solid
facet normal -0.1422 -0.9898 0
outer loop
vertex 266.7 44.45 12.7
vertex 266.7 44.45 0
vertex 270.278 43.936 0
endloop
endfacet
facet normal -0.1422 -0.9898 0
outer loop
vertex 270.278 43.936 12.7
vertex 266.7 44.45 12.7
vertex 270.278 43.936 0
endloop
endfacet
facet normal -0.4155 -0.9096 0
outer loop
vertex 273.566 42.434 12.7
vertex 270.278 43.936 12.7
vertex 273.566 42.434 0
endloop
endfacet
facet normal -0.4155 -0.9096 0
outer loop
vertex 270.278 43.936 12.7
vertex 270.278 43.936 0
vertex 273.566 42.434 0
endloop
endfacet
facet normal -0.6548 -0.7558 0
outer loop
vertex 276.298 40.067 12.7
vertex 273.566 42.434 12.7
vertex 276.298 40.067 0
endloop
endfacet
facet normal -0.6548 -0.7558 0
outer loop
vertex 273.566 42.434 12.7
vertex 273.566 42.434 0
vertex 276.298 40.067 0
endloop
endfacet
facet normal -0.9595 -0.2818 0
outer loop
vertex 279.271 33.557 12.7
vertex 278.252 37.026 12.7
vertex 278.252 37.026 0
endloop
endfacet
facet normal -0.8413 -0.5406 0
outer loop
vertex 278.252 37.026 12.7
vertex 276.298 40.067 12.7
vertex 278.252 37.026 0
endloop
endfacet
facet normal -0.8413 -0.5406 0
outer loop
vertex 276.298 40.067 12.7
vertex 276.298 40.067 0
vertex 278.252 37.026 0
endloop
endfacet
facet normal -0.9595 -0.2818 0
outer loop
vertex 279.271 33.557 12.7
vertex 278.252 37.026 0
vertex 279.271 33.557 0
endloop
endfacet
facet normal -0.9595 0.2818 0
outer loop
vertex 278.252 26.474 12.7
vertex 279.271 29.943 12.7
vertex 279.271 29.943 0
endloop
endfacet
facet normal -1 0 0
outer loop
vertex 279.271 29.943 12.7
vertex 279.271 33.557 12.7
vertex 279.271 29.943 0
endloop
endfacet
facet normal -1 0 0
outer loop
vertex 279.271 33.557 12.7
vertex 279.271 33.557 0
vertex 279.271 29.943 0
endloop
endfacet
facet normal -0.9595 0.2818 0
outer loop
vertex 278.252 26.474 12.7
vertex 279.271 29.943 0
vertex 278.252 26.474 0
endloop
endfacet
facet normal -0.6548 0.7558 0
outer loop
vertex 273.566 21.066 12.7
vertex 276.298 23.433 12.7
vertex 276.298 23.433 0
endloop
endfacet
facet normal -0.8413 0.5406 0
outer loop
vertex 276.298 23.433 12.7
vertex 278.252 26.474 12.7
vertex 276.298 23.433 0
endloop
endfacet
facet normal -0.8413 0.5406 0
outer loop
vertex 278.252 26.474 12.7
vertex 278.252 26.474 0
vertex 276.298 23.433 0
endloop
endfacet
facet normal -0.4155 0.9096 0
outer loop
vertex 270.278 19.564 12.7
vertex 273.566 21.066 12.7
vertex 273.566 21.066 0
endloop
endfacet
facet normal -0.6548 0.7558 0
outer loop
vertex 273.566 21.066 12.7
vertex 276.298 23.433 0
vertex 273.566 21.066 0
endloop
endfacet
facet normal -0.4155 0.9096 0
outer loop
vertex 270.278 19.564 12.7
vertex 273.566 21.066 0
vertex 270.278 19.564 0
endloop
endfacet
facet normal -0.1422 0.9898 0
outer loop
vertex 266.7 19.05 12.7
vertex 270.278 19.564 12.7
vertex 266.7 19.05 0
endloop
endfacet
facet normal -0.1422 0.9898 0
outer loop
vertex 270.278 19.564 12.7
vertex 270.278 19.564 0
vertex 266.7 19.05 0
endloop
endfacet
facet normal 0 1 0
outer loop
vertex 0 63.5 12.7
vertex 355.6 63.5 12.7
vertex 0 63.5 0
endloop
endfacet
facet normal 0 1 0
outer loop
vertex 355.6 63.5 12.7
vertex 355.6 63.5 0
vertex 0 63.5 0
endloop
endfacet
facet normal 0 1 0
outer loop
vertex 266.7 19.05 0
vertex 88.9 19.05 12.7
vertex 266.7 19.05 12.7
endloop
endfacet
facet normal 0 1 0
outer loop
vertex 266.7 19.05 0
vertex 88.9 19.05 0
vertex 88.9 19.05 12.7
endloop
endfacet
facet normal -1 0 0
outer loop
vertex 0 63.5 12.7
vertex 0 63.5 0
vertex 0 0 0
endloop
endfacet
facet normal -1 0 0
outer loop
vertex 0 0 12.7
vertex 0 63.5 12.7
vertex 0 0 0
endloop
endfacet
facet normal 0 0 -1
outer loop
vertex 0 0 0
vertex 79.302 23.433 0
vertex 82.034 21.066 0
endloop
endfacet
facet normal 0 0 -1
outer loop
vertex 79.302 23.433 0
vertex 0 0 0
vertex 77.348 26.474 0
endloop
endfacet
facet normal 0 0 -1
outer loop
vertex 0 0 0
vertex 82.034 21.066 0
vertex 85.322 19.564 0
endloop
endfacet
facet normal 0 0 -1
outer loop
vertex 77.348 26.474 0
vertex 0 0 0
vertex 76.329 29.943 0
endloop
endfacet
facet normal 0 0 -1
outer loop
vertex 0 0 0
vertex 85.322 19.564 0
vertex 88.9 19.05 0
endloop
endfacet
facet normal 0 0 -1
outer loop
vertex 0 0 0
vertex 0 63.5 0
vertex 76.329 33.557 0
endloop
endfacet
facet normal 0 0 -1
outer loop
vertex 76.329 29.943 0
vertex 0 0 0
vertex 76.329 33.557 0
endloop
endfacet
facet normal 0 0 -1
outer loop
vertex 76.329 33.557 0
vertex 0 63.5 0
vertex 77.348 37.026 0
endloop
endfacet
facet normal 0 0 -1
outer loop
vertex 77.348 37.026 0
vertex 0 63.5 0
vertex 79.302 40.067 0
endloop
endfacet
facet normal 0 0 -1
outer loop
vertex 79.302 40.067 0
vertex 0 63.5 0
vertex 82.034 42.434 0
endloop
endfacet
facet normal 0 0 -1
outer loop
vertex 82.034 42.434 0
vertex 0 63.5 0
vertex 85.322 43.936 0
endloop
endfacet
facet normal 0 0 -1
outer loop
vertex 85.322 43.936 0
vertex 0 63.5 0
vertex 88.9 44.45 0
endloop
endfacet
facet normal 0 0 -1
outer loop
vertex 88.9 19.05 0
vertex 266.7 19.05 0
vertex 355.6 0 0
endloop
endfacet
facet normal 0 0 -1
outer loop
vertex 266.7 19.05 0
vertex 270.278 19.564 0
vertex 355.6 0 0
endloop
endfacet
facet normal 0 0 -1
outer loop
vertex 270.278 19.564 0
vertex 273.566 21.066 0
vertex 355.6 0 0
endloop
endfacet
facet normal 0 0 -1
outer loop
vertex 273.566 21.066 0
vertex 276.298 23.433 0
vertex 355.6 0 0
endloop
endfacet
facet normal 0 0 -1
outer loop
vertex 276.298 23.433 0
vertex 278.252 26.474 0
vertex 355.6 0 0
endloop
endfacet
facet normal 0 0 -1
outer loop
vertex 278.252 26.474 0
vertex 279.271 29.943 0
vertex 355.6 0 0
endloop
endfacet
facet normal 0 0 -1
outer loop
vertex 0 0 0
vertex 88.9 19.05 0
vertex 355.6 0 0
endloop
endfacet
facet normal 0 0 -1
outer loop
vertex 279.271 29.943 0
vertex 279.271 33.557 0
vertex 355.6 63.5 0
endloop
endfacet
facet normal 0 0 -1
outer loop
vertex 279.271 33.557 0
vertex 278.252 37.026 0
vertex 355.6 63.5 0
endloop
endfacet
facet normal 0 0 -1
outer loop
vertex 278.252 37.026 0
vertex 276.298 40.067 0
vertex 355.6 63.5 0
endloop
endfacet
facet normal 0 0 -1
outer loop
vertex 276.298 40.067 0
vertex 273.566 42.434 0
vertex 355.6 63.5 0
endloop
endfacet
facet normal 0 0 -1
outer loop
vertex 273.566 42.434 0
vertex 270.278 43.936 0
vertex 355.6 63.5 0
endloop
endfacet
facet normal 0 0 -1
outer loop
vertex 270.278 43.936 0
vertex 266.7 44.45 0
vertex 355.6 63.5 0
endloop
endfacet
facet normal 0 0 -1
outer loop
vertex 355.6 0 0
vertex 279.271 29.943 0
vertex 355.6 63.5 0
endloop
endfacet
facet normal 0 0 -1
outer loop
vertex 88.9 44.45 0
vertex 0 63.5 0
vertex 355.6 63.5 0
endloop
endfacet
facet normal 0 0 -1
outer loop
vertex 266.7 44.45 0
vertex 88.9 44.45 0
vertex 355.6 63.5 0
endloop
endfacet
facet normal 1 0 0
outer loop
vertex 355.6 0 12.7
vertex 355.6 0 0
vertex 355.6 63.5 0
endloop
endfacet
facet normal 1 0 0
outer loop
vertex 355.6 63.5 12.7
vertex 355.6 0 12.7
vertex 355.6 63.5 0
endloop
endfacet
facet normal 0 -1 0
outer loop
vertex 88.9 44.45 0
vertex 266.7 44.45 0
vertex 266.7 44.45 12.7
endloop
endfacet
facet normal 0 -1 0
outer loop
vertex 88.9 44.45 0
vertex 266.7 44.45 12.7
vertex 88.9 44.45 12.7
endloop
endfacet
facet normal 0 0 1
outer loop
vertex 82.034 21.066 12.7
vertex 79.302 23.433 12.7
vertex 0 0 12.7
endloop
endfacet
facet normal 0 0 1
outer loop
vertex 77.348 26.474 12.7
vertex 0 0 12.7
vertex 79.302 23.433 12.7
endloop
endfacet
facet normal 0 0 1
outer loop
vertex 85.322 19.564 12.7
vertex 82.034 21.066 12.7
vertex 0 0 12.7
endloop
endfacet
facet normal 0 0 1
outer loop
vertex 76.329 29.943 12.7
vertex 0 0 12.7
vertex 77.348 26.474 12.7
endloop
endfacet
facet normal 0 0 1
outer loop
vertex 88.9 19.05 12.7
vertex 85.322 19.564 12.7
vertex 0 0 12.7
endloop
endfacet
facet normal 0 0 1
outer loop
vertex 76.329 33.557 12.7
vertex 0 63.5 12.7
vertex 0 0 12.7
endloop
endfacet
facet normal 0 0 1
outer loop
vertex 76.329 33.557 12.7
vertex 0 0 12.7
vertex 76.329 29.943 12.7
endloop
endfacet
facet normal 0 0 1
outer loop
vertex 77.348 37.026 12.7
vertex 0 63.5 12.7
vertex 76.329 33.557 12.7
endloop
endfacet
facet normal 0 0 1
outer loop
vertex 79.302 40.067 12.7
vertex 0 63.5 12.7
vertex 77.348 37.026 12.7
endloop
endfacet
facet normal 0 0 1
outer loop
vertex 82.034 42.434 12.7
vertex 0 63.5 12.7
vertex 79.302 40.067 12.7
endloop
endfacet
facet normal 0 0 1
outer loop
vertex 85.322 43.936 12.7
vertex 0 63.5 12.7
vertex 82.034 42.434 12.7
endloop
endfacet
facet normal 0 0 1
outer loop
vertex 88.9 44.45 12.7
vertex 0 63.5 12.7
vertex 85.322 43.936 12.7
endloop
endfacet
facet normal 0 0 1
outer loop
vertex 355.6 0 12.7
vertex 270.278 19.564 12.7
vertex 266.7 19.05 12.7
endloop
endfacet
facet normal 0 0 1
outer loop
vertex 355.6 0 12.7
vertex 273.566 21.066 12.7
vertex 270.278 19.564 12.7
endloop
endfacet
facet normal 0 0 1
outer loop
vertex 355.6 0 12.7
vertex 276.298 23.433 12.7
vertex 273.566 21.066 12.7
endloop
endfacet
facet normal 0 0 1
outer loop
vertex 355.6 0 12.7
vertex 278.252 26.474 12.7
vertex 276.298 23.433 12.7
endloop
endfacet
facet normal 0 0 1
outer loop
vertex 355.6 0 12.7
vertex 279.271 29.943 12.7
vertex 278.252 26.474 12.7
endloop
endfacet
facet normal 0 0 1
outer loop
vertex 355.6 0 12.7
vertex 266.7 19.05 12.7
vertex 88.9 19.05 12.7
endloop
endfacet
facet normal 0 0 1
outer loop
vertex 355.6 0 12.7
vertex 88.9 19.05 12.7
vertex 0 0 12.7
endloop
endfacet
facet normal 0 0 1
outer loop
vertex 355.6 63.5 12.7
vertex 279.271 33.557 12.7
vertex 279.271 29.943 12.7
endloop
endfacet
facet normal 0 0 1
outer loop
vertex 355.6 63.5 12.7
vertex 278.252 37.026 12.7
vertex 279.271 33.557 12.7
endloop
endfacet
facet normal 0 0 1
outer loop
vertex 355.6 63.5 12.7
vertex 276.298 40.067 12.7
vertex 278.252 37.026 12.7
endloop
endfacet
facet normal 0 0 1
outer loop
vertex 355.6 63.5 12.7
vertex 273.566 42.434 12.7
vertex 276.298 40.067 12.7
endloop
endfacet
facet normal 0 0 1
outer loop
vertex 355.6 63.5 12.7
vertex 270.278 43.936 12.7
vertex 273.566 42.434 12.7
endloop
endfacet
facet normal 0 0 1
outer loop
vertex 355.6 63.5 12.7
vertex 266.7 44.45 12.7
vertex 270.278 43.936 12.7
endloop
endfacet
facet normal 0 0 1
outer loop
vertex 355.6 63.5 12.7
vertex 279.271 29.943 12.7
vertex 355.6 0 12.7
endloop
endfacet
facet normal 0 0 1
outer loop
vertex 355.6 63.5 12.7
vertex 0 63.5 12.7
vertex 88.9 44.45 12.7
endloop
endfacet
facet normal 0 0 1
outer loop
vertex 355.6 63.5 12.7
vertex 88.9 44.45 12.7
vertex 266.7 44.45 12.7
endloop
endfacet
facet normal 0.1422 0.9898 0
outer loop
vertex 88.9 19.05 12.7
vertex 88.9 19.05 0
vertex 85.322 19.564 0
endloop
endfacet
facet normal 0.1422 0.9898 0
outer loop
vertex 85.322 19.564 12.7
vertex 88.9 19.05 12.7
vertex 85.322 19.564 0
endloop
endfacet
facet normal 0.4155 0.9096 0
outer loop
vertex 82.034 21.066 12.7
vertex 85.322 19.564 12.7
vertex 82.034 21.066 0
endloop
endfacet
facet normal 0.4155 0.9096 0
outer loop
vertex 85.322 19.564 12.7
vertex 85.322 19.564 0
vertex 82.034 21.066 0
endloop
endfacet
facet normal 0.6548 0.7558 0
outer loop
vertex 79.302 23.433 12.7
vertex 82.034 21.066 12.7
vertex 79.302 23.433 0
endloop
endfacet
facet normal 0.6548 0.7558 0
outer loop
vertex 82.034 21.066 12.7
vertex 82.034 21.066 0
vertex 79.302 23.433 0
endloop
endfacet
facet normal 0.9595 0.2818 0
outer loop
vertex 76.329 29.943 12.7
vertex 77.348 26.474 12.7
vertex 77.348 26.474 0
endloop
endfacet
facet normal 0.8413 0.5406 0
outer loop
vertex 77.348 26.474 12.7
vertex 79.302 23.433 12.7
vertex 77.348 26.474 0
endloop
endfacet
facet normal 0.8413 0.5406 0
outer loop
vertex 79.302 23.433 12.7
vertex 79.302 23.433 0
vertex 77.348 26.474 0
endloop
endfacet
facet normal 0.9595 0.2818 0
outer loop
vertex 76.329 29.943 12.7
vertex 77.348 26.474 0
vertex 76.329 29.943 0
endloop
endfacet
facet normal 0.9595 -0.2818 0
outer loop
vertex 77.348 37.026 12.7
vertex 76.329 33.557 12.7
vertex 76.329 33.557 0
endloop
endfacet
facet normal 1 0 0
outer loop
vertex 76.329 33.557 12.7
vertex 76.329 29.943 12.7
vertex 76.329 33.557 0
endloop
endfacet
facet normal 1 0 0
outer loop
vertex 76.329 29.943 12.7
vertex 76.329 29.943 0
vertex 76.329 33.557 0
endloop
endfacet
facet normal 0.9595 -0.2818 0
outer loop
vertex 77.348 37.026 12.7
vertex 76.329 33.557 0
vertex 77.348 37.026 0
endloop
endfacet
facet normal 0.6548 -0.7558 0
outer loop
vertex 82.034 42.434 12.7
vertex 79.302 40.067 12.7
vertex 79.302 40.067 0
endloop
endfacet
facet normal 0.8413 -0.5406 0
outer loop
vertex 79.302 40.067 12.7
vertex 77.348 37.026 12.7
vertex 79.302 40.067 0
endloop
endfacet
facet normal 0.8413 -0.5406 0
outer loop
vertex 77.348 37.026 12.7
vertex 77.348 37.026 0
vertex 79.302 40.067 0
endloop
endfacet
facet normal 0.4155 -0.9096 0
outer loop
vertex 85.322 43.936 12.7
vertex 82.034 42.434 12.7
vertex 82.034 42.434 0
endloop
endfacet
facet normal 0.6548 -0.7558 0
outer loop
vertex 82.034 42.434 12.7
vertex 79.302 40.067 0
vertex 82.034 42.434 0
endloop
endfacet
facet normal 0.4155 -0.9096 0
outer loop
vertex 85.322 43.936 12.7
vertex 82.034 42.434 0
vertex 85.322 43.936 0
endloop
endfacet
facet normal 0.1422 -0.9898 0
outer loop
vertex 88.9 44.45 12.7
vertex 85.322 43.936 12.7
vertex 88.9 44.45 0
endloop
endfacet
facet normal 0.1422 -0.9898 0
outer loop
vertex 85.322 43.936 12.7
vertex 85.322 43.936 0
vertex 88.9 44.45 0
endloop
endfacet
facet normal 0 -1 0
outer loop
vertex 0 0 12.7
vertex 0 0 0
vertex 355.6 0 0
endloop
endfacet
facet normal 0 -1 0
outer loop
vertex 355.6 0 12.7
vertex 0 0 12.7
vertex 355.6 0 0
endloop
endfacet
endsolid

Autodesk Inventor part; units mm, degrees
ref_plane "YZ Plane" through (0, 0, 0) normal (1, 0, 0) x (0, 1, 0)
ref_plane "XZ Plane" through (0, 0, 0) normal (0, 1, 0) x (-1, 0, 0)
ref_plane "XY Plane" through (0, 0, 0) normal (0, 0, 1) x (1, 0, 0)
sketch "Sketch1" plane through (0, 0, 0) normal (0, 0, 1) x (1, 0, 0)
  line L0 (0, 0) -> (355.6, 0)
  line L1 (355.6, 0) -> (355.6, 63.5)
  line L2 (355.6, 63.5) -> (0, 63.5)
  line L3 (0, 63.5) -> (0, 0)
  line L4 (88.9, 31.75) -> (266.7, 31.75) construction
  line L5 (88.9, 19.05) -> (266.7, 19.05)
  line L6 (266.7, 44.45) -> (88.9, 44.45)
  arc A0 (88.9, 44.45) -> (88.9, 19.05) centre (88.9, 31.75) ccw
  arc A1 (266.7, 19.05) -> (266.7, 44.45) centre (266.7, 31.75) ccw
  point P0 (177.8, 31.75)
  dimension "d0" = 355.6
  dimension "d1" = 63.5
  dimension "d4" = 25.4
  dimension "d5" = 177.8
  dimension "d6" = 177.8
extrude "Extrusion1" add sketch "Sketch1" along normal blind 12.7
properties part number "Electronics Side Plate"
